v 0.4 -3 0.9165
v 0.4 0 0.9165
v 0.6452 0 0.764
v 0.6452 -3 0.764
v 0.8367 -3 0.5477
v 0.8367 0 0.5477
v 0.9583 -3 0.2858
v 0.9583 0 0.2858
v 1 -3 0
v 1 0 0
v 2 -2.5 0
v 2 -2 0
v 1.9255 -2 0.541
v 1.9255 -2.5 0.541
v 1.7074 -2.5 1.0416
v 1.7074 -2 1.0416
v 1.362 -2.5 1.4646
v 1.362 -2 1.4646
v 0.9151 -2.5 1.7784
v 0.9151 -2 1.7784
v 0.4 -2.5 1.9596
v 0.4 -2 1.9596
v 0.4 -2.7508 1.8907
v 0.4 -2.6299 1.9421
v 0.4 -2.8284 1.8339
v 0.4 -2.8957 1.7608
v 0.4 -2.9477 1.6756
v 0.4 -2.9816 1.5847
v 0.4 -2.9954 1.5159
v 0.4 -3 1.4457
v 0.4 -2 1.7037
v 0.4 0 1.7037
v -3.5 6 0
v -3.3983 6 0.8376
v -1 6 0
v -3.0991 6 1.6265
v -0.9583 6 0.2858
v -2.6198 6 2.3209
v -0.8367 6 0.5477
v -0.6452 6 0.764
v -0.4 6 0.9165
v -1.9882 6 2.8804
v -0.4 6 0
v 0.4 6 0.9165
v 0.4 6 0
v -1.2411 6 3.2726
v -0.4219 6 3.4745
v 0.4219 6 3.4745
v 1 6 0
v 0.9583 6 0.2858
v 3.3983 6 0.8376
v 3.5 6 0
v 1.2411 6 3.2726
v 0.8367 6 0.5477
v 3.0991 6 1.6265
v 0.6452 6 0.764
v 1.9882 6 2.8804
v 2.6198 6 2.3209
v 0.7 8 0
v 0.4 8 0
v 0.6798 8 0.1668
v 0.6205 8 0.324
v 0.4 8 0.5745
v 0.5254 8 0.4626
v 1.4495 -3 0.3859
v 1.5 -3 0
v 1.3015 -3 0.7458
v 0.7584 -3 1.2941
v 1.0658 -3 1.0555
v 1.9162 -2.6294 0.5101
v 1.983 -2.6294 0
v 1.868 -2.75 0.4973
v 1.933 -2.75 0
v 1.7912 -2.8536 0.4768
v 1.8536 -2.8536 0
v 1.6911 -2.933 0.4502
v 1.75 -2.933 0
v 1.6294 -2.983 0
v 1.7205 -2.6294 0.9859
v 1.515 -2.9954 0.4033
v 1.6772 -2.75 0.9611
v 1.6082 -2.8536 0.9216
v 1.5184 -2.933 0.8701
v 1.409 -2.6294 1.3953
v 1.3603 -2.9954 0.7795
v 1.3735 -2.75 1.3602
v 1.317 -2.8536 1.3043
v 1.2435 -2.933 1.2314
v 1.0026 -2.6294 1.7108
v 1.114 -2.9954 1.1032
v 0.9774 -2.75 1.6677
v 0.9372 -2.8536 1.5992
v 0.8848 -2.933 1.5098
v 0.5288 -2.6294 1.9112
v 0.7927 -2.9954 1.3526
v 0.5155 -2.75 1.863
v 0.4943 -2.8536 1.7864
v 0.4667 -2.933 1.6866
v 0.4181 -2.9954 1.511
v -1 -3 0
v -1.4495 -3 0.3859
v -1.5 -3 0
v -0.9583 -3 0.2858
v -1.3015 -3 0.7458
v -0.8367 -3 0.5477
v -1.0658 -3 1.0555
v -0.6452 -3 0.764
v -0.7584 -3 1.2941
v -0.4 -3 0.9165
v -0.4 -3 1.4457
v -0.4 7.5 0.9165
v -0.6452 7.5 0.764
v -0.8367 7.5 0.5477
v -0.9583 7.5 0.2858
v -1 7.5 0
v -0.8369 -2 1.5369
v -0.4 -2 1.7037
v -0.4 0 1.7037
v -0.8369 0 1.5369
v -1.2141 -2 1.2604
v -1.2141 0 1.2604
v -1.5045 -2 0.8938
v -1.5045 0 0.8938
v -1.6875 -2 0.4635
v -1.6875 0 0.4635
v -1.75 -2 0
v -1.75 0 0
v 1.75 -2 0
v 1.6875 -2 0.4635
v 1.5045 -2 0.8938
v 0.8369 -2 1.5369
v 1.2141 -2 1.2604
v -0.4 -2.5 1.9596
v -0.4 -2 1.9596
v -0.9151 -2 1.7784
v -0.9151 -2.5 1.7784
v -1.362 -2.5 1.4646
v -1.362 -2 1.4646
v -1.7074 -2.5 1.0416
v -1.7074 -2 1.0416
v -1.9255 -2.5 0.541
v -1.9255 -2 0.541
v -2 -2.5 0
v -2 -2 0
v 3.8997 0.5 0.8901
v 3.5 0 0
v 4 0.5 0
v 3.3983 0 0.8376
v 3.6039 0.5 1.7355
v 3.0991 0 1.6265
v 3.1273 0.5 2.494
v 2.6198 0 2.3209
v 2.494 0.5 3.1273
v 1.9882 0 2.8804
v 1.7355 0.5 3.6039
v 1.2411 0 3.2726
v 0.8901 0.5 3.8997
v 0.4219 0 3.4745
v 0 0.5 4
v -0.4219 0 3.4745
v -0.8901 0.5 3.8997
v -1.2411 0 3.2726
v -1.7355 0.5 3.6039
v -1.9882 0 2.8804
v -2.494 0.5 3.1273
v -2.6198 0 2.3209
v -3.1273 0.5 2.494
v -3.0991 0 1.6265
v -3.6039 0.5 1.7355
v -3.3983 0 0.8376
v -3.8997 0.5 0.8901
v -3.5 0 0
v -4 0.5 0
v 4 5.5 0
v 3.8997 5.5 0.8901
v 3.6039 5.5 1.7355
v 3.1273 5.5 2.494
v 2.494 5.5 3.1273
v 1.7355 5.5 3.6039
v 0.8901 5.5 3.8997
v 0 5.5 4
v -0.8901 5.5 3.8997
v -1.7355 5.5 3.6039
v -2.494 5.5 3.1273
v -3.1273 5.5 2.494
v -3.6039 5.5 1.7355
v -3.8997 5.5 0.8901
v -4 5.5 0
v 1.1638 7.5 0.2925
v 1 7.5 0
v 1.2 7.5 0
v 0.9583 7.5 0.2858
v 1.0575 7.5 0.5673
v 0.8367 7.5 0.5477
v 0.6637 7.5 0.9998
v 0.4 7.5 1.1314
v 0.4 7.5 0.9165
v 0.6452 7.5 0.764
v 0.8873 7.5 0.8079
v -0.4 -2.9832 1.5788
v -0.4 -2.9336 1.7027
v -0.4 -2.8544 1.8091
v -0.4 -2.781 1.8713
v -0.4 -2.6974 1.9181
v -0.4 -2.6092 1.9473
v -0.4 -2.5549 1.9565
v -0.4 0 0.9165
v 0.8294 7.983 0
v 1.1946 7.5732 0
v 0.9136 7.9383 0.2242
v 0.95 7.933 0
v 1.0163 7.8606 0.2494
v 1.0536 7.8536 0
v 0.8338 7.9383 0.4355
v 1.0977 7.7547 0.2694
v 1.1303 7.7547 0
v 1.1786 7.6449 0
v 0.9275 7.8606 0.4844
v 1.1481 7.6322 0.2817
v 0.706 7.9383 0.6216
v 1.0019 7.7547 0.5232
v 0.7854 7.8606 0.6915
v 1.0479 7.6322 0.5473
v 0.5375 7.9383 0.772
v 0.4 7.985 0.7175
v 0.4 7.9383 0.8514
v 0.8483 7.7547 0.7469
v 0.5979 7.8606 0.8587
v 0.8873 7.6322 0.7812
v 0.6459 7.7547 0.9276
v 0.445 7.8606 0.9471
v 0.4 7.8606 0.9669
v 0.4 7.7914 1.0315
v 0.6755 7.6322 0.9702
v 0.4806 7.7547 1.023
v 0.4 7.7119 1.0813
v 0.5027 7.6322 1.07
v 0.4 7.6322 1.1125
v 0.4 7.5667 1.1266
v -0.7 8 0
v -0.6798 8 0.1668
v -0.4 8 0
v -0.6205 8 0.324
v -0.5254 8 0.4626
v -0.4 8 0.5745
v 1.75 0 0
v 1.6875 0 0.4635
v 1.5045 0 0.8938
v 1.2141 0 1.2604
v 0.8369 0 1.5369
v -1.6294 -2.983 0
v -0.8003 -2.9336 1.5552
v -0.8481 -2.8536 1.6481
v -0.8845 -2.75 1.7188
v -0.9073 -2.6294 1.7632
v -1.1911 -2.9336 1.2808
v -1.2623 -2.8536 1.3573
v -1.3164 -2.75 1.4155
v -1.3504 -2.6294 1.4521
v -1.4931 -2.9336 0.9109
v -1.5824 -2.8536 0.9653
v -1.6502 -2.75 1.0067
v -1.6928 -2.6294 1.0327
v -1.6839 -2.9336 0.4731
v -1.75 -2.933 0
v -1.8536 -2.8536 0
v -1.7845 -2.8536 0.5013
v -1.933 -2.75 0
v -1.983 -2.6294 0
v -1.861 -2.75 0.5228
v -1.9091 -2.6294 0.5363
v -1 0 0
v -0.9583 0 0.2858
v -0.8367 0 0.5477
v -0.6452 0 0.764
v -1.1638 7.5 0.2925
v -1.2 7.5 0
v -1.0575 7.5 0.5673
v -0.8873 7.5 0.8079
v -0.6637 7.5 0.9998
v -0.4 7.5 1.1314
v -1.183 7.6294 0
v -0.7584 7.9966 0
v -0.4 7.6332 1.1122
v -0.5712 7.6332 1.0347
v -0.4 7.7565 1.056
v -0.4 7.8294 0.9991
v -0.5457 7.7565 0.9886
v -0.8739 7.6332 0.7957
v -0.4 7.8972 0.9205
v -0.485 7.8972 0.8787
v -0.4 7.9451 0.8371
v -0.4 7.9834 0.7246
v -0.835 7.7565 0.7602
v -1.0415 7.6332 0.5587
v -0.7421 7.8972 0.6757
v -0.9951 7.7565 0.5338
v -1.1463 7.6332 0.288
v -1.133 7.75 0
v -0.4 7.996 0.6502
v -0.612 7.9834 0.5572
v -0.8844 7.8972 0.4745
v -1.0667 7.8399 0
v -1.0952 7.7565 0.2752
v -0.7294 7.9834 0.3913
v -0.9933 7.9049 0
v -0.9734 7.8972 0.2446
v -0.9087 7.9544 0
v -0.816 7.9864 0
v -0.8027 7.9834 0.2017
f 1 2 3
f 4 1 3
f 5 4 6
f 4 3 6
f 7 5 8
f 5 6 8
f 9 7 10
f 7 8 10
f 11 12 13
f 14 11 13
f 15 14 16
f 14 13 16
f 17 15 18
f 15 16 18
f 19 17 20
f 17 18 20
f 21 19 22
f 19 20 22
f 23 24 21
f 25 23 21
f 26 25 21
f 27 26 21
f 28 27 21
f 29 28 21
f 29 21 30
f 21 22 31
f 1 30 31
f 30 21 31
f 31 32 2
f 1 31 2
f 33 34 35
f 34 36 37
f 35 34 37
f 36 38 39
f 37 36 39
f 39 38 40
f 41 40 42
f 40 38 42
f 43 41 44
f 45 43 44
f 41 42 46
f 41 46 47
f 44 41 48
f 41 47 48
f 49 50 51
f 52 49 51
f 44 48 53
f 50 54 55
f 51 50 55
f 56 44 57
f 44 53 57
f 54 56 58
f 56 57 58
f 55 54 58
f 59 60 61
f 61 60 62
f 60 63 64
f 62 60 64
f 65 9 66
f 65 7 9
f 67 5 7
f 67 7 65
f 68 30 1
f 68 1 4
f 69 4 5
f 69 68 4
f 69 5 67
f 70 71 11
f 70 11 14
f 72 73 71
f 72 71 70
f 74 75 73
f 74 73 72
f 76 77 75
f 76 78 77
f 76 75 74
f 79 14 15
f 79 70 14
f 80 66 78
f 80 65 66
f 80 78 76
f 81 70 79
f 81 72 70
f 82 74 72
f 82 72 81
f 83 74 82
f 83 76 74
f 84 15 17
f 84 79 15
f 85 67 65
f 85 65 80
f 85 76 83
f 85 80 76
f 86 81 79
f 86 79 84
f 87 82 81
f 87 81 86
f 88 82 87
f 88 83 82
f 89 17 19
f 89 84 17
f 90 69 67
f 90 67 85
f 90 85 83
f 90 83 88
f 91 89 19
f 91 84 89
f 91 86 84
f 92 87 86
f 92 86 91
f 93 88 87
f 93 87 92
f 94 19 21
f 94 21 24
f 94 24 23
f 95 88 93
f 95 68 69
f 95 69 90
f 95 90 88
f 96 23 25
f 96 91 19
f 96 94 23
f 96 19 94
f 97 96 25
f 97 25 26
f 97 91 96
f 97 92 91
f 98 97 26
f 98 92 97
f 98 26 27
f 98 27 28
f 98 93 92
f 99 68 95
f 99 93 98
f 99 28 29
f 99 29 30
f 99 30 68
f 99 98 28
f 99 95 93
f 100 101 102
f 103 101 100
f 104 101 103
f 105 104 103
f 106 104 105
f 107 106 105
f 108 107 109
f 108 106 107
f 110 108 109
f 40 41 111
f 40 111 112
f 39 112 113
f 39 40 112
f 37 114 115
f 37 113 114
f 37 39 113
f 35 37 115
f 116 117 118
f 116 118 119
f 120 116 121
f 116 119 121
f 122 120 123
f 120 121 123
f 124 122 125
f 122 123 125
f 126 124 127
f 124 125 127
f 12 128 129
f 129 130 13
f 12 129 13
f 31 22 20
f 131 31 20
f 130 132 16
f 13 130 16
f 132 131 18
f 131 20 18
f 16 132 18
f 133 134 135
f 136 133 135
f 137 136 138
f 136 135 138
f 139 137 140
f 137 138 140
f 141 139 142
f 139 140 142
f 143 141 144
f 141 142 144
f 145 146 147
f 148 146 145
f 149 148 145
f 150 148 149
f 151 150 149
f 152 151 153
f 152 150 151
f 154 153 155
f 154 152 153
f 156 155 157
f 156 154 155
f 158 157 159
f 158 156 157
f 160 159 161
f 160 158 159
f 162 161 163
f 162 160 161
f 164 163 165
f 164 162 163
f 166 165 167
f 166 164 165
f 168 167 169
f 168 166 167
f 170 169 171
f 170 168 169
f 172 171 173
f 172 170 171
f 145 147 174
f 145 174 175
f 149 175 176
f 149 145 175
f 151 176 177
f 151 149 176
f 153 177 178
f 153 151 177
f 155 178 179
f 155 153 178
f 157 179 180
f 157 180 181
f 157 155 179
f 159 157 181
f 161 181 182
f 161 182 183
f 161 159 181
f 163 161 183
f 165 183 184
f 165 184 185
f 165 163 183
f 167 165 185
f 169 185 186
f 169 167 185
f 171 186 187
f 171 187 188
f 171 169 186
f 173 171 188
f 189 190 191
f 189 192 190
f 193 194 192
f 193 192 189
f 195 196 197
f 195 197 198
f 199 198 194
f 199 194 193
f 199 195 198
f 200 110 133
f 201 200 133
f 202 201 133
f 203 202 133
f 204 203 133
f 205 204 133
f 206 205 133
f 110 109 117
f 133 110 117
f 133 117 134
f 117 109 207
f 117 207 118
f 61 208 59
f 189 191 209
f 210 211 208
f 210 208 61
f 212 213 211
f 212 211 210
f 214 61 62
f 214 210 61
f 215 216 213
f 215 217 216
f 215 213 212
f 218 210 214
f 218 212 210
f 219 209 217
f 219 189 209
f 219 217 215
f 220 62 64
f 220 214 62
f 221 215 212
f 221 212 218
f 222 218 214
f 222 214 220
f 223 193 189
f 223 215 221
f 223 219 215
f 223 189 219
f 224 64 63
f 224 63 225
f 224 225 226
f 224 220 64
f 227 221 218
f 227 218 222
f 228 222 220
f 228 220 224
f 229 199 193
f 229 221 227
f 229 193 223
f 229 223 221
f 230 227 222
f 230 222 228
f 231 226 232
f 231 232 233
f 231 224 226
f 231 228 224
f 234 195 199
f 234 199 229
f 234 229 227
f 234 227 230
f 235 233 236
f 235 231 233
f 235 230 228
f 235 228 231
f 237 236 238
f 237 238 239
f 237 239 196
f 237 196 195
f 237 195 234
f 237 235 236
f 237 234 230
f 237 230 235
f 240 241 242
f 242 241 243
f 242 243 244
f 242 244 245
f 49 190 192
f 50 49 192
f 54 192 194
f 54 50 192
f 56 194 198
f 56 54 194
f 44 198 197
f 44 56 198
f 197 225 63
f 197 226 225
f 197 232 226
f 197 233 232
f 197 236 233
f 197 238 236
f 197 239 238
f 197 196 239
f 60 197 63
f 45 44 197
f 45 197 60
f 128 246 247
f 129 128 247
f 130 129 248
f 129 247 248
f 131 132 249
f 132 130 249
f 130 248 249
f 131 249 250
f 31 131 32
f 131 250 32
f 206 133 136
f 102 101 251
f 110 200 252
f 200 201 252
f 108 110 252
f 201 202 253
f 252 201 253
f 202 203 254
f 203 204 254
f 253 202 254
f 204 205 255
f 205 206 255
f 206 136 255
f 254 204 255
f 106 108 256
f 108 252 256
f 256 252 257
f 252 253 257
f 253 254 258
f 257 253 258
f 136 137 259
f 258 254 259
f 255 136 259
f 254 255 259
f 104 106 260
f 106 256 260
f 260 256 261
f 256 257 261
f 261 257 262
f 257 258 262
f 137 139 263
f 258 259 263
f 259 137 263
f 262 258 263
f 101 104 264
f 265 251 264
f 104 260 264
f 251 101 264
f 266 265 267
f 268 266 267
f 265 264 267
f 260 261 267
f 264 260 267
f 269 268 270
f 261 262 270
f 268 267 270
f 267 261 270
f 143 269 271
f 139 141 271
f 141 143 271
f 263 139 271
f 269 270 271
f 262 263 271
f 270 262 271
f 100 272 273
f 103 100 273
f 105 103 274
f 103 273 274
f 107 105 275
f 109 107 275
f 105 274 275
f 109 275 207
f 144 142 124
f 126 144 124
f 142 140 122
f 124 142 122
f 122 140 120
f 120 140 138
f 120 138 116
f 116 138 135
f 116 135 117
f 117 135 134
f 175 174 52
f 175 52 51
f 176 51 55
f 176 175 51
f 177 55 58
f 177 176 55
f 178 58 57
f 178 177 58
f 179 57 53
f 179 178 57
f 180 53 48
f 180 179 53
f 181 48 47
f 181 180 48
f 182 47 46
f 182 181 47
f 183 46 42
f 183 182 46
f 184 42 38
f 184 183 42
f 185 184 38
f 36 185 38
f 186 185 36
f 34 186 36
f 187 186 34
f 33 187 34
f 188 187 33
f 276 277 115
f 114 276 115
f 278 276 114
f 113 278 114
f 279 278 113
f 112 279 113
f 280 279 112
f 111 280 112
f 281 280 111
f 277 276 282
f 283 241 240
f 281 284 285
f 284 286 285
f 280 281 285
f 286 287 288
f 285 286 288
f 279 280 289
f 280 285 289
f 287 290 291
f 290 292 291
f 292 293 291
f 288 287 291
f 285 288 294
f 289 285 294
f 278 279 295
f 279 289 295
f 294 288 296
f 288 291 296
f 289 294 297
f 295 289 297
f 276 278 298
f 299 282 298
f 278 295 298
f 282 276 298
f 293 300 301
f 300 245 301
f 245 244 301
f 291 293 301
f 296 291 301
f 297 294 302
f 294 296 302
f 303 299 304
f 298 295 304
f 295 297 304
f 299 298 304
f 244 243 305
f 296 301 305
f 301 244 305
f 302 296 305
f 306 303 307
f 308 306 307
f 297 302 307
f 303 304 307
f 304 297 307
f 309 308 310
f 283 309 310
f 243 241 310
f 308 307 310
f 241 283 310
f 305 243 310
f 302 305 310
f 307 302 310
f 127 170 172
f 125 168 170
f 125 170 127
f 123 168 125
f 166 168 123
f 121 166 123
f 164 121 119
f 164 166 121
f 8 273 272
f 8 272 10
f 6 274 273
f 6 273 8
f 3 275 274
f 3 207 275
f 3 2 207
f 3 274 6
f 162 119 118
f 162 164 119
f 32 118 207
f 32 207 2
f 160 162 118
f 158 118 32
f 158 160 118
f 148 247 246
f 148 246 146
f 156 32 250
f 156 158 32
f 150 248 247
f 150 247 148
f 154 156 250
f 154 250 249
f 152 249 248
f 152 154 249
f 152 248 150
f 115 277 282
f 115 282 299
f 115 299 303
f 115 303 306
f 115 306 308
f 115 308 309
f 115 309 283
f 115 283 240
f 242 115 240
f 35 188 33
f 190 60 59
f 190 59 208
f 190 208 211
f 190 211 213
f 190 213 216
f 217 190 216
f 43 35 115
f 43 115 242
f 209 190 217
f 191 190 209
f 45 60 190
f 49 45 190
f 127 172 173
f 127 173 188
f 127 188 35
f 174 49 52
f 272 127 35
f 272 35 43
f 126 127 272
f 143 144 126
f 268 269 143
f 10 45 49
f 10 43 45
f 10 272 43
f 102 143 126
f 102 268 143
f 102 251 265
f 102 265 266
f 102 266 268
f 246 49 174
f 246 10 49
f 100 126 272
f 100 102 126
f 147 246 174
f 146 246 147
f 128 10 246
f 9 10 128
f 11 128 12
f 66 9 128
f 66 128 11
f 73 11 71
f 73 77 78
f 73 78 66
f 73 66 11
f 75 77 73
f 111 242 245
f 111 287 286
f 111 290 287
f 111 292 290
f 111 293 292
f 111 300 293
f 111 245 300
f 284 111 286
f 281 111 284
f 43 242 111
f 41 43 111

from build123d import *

# Parameters (mm, degrees)
F1_DEPTH = 6
F2_DEPTH = 3
F3_START = 2
F3_DEPTH = 1
F4_SIZE  = 0.5
F5_DEPTH = 8
F6_START = -7.5
F6_DEPTH = 0.5
F7_R     = 0.49999


# Not quite as in the source:
# - a fillet or chamfer is up to 0.001 mm smaller than in the source, because OpenCascade refuses the exact size


with BuildPart() as f1:
    # F0 (on Front) → F1 (new body)
    with BuildSketch(Plane.XZ):
        with BuildLine():
            Line((2, 0), (4, 0))
            ThreePointArc((4, 0), (0, 4), (-4, 0))
            Line((-4, 0), (-2, 0))
            ThreePointArc((-2, 0), (-1.5491933385, 1.2649110641), (-0.4, 1.9595917942))
            Line((-0.4, 1.9595917942), (-0.4, 2))
            Line((-0.4, 2), (0, 2))
            Line((0, 2), (0.4, 2))
            Line((0.4, 2), (0.4, 1.9595917942))
            ThreePointArc((0.4, 1.9595917942), (1.5491933385, 1.2649110641), (2, 0))
        make_face()
        with BuildLine():
            Line((1.75, 0), (2, 0))
            ThreePointArc((2, 0), (1.5491933385, 1.2649110641), (0.4, 1.9595917942))
            Line((0.4, 1.9595917942), (0.4, 1.7036725037))
            ThreePointArc((0.4, 1.7036725037), (1.3715866724, 1.086853256), (1.75, 0))
        make_face()
        with BuildLine():
            ThreePointArc((-0.4, 1.9595917942), (-1.5491933385, 1.2649110641), (-2, 0))
            Line((-2, 0), (-1.75, 0))
            ThreePointArc((-1.75, 0), (-1.3715866724, 1.086853256), (-0.4, 1.7036725037))
            Line((-0.4, 1.7036725037), (-0.4, 1.9595917942))
        make_face()
        with BuildLine():
            Line((1.2, 0), (1.75, 0))
            ThreePointArc((1.75, 0), (1.3715866724, 1.086853256), (0.4, 1.7036725037))
            Line((0.4, 1.7036725037), (0.4, 1.1313708499))
            ThreePointArc((0.4, 1.1313708499), (0.9797958971, 0.692820323), (1.2, 0))
        make_face()
        with BuildLine():
            ThreePointArc((0, 2), (0.201017924, 1.989872306), (0.4, 1.9595917942))
            Line((0.4, 1.9595917942), (0.4, 2))
            Line((0.4, 2), (0, 2))
        make_face()
        with BuildLine():
            Line((0.4, 1.7036725037), (0.4, 1.9595917942))
            ThreePointArc((0.4, 1.9595917942), (0.201017924, 1.989872306), (0, 2))
            ThreePointArc((0, 2), (-0.201017924, 1.989872306), (-0.4, 1.9595917942))
            Line((-0.4, 1.9595917942), (-0.4, 1.7036725037))
            ThreePointArc((-0.4, 1.7036725037), (0, 1.75), (0.4, 1.7036725037))
        make_face()
        with BuildLine():
            ThreePointArc((-0.4, 1.7036725037), (-1.3715866724, 1.086853256), (-1.75, 0))
            Line((-1.75, 0), (-1.2, 0))
            ThreePointArc((-1.2, 0), (-0.9797958971, 0.692820323), (-0.4, 1.1313708499))
            Line((-0.4, 1.1313708499), (-0.4, 1.7036725037))
        make_face()
        with BuildLine():
            Line((-0.4, 2), (-0.4, 1.9595917942))
            ThreePointArc((-0.4, 1.9595917942), (-0.201017924, 1.989872306), (0, 2))
            Line((0, 2), (-0.4, 2))
        make_face()
        with BuildLine():
            Line((1, 0), (1.2, 0))
            ThreePointArc((1.2, 0), (0.9797958971, 0.692820323), (0.4, 1.1313708499))
            Line((0.4, 1.1313708499), (0.4, 0.916515139))
            ThreePointArc((0.4, 0.916515139), (0.8366600265, 0.5477225575), (1, 0))
        make_face()
        with BuildLine():
            Line((0.4, 1.1313708499), (0.4, 1.7036725037))
            ThreePointArc((0.4, 1.7036725037), (0, 1.75), (-0.4, 1.7036725037))
            Line((-0.4, 1.7036725037), (-0.4, 1.1313708499))
            ThreePointArc((-0.4, 1.1313708499), (0, 1.2), (0.4, 1.1313708499))
        make_face()
        with BuildLine():
            ThreePointArc((-0.4, 1.1313708499), (-0.9797958971, 0.692820323), (-1.2, 0))
            Line((-1.2, 0), (-1, 0))
            ThreePointArc((-1, 0), (-0.8366600265, 0.5477225575), (-0.4, 0.916515139))
            Line((-0.4, 0.916515139), (-0.4, 1.1313708499))
        make_face()
        with BuildLine():
            Line((0.4, 0), (1, 0))
            ThreePointArc((1, 0), (0.8366600265, 0.5477225575), (0.4, 0.916515139))
            Line((0.4, 0.916515139), (0.4, 0))
        make_face()
        with BuildLine():
            Line((0.4, 0.916515139), (0.4, 1.1313708499))
            ThreePointArc((0.4, 1.1313708499), (0, 1.2), (-0.4, 1.1313708499))
            Line((-0.4, 1.1313708499), (-0.4, 0.916515139))
            ThreePointArc((-0.4, 0.916515139), (0, 1), (0.4, 0.916515139))
        make_face()
        with BuildLine():
            ThreePointArc((-0.4, 0.916515139), (-0.8366600265, 0.5477225575), (-1, 0))
            Line((-1, 0), (-0.4, 0))
            Line((-0.4, 0), (-0.4, 0.916515139))
        make_face()
        with BuildLine():
            Line((-0.4, 0), (0.4, 0))
            Line((0.4, 0), (0.4, 0.916515139))
            ThreePointArc((0.4, 0.916515139), (0, 1), (-0.4, 0.916515139))
            Line((-0.4, 0.916515139), (-0.4, 0))
        make_face()
    extrude(amount=-F1_DEPTH)

    # F0 (on Front) → F2 (join)
    with BuildSketch(Plane.XZ):
        with BuildLine():
            ThreePointArc((-0.4, 1.7036725037), (-1.3715866724, 1.086853256), (-1.75, 0))
            Line((-1.75, 0), (-1.2, 0))
            ThreePointArc((-1.2, 0), (-0.9797958971, 0.692820323), (-0.4, 1.1313708499))
            Line((-0.4, 1.1313708499), (-0.4, 1.7036725037))
        make_face()
        with BuildLine():
            Line((1, 0), (1.2, 0))
            ThreePointArc((1.2, 0), (0.9797958971, 0.692820323), (0.4, 1.1313708499))
            Line((0.4, 1.1313708499), (0.4, 0.916515139))
            ThreePointArc((0.4, 0.916515139), (0.8366600265, 0.5477225575), (1, 0))
        make_face()
        with BuildLine():
            Line((1.2, 0), (1.75, 0))
            ThreePointArc((1.75, 0), (1.3715866724, 1.086853256), (0.4, 1.7036725037))
            Line((0.4, 1.7036725037), (0.4, 1.1313708499))
            ThreePointArc((0.4, 1.1313708499), (0.9797958971, 0.692820323), (1.2, 0))
        make_face()
        with BuildLine():
            ThreePointArc((-0.4, 1.1313708499), (-0.9797958971, 0.692820323), (-1.2, 0))
            Line((-1.2, 0), (-1, 0))
            ThreePointArc((-1, 0), (-0.8366600265, 0.5477225575), (-0.4, 0.916515139))
            Line((-0.4, 0.916515139), (-0.4, 1.1313708499))
        make_face()
    extrude(amount=F2_DEPTH)

    # F0 (on Front) → F3 (join)
    with BuildSketch(Plane.XZ.offset(F3_START)):
        with BuildLine():
            Line((1.75, 0), (2, 0))
            ThreePointArc((2, 0), (1.5491933385, 1.2649110641), (0.4, 1.9595917942))
            Line((0.4, 1.9595917942), (0.4, 1.7036725037))
            ThreePointArc((0.4, 1.7036725037), (1.3715866724, 1.086853256), (1.75, 0))
        make_face()
        with BuildLine():
            ThreePointArc((-0.4, 1.9595917942), (-1.5491933385, 1.2649110641), (-2, 0))
            Line((-2, 0), (-1.75, 0))
            ThreePointArc((-1.75, 0), (-1.3715866724, 1.086853256), (-0.4, 1.7036725037))
            Line((-0.4, 1.7036725037), (-0.4, 1.9595917942))
        make_face()
    extrude(amount=F3_DEPTH)

    # F4
    f4_edges = [f1.edges().sort_by_distance(p)[0] for p in [
        (0, 0, 4),
        (0, 6, 4),
    ]]
    chamfer(f4_edges, length=F4_SIZE)

    # F0 (on Front) → F5 (join)
    with BuildSketch(Plane.XZ):
        with BuildLine():
            Line((0.4, 0), (1, 0))
            ThreePointArc((1, 0), (0.8366600265, 0.5477225575), (0.4, 0.916515139))
            Line((0.4, 0.916515139), (0.4, 0))
        make_face()
        with BuildLine():
            ThreePointArc((-0.4, 0.916515139), (-0.8366600265, 0.5477225575), (-1, 0))
            Line((-1, 0), (-0.4, 0))
            Line((-0.4, 0), (-0.4, 0.916515139))
        make_face()
    extrude(amount=-F5_DEPTH)

    # F0 (on Front) → F6 (join)
    with BuildSketch(Plane.XZ.offset(F6_START)):
        with BuildLine():
            ThreePointArc((-0.4, 1.1313708499), (-0.9797958971, 0.692820323), (-1.2, 0))
            Line((-1.2, 0), (-1, 0))
            ThreePointArc((-1, 0), (-0.8366600265, 0.5477225575), (-0.4, 0.916515139))
            Line((-0.4, 0.916515139), (-0.4, 1.1313708499))
        make_face()
        with BuildLine():
            Line((1, 0), (1.2, 0))
            ThreePointArc((1.2, 0), (0.9797958971, 0.692820323), (0.4, 1.1313708499))
            Line((0.4, 1.1313708499), (0.4, 0.916515139))
            ThreePointArc((0.4, 0.916515139), (0.8366600265, 0.5477225575), (1, 0))
        make_face()
    extrude(amount=-F6_DEPTH)

    # F7 (radius 0.5 in the source; OpenCascade refuses exactly that, so slightly less here)
    f7_edges = [f1.edges().sort_by_distance(p)[0] for p in [
        (0.979796, 8, 0.69282),
        (-0.979796, 8, 0.69282),
        (1.549193, -3, 1.264911),
        (-1.549193, -3, 1.264911),
    ]]
    fillet(f7_edges, radius=F7_R)


solid = f1.part
